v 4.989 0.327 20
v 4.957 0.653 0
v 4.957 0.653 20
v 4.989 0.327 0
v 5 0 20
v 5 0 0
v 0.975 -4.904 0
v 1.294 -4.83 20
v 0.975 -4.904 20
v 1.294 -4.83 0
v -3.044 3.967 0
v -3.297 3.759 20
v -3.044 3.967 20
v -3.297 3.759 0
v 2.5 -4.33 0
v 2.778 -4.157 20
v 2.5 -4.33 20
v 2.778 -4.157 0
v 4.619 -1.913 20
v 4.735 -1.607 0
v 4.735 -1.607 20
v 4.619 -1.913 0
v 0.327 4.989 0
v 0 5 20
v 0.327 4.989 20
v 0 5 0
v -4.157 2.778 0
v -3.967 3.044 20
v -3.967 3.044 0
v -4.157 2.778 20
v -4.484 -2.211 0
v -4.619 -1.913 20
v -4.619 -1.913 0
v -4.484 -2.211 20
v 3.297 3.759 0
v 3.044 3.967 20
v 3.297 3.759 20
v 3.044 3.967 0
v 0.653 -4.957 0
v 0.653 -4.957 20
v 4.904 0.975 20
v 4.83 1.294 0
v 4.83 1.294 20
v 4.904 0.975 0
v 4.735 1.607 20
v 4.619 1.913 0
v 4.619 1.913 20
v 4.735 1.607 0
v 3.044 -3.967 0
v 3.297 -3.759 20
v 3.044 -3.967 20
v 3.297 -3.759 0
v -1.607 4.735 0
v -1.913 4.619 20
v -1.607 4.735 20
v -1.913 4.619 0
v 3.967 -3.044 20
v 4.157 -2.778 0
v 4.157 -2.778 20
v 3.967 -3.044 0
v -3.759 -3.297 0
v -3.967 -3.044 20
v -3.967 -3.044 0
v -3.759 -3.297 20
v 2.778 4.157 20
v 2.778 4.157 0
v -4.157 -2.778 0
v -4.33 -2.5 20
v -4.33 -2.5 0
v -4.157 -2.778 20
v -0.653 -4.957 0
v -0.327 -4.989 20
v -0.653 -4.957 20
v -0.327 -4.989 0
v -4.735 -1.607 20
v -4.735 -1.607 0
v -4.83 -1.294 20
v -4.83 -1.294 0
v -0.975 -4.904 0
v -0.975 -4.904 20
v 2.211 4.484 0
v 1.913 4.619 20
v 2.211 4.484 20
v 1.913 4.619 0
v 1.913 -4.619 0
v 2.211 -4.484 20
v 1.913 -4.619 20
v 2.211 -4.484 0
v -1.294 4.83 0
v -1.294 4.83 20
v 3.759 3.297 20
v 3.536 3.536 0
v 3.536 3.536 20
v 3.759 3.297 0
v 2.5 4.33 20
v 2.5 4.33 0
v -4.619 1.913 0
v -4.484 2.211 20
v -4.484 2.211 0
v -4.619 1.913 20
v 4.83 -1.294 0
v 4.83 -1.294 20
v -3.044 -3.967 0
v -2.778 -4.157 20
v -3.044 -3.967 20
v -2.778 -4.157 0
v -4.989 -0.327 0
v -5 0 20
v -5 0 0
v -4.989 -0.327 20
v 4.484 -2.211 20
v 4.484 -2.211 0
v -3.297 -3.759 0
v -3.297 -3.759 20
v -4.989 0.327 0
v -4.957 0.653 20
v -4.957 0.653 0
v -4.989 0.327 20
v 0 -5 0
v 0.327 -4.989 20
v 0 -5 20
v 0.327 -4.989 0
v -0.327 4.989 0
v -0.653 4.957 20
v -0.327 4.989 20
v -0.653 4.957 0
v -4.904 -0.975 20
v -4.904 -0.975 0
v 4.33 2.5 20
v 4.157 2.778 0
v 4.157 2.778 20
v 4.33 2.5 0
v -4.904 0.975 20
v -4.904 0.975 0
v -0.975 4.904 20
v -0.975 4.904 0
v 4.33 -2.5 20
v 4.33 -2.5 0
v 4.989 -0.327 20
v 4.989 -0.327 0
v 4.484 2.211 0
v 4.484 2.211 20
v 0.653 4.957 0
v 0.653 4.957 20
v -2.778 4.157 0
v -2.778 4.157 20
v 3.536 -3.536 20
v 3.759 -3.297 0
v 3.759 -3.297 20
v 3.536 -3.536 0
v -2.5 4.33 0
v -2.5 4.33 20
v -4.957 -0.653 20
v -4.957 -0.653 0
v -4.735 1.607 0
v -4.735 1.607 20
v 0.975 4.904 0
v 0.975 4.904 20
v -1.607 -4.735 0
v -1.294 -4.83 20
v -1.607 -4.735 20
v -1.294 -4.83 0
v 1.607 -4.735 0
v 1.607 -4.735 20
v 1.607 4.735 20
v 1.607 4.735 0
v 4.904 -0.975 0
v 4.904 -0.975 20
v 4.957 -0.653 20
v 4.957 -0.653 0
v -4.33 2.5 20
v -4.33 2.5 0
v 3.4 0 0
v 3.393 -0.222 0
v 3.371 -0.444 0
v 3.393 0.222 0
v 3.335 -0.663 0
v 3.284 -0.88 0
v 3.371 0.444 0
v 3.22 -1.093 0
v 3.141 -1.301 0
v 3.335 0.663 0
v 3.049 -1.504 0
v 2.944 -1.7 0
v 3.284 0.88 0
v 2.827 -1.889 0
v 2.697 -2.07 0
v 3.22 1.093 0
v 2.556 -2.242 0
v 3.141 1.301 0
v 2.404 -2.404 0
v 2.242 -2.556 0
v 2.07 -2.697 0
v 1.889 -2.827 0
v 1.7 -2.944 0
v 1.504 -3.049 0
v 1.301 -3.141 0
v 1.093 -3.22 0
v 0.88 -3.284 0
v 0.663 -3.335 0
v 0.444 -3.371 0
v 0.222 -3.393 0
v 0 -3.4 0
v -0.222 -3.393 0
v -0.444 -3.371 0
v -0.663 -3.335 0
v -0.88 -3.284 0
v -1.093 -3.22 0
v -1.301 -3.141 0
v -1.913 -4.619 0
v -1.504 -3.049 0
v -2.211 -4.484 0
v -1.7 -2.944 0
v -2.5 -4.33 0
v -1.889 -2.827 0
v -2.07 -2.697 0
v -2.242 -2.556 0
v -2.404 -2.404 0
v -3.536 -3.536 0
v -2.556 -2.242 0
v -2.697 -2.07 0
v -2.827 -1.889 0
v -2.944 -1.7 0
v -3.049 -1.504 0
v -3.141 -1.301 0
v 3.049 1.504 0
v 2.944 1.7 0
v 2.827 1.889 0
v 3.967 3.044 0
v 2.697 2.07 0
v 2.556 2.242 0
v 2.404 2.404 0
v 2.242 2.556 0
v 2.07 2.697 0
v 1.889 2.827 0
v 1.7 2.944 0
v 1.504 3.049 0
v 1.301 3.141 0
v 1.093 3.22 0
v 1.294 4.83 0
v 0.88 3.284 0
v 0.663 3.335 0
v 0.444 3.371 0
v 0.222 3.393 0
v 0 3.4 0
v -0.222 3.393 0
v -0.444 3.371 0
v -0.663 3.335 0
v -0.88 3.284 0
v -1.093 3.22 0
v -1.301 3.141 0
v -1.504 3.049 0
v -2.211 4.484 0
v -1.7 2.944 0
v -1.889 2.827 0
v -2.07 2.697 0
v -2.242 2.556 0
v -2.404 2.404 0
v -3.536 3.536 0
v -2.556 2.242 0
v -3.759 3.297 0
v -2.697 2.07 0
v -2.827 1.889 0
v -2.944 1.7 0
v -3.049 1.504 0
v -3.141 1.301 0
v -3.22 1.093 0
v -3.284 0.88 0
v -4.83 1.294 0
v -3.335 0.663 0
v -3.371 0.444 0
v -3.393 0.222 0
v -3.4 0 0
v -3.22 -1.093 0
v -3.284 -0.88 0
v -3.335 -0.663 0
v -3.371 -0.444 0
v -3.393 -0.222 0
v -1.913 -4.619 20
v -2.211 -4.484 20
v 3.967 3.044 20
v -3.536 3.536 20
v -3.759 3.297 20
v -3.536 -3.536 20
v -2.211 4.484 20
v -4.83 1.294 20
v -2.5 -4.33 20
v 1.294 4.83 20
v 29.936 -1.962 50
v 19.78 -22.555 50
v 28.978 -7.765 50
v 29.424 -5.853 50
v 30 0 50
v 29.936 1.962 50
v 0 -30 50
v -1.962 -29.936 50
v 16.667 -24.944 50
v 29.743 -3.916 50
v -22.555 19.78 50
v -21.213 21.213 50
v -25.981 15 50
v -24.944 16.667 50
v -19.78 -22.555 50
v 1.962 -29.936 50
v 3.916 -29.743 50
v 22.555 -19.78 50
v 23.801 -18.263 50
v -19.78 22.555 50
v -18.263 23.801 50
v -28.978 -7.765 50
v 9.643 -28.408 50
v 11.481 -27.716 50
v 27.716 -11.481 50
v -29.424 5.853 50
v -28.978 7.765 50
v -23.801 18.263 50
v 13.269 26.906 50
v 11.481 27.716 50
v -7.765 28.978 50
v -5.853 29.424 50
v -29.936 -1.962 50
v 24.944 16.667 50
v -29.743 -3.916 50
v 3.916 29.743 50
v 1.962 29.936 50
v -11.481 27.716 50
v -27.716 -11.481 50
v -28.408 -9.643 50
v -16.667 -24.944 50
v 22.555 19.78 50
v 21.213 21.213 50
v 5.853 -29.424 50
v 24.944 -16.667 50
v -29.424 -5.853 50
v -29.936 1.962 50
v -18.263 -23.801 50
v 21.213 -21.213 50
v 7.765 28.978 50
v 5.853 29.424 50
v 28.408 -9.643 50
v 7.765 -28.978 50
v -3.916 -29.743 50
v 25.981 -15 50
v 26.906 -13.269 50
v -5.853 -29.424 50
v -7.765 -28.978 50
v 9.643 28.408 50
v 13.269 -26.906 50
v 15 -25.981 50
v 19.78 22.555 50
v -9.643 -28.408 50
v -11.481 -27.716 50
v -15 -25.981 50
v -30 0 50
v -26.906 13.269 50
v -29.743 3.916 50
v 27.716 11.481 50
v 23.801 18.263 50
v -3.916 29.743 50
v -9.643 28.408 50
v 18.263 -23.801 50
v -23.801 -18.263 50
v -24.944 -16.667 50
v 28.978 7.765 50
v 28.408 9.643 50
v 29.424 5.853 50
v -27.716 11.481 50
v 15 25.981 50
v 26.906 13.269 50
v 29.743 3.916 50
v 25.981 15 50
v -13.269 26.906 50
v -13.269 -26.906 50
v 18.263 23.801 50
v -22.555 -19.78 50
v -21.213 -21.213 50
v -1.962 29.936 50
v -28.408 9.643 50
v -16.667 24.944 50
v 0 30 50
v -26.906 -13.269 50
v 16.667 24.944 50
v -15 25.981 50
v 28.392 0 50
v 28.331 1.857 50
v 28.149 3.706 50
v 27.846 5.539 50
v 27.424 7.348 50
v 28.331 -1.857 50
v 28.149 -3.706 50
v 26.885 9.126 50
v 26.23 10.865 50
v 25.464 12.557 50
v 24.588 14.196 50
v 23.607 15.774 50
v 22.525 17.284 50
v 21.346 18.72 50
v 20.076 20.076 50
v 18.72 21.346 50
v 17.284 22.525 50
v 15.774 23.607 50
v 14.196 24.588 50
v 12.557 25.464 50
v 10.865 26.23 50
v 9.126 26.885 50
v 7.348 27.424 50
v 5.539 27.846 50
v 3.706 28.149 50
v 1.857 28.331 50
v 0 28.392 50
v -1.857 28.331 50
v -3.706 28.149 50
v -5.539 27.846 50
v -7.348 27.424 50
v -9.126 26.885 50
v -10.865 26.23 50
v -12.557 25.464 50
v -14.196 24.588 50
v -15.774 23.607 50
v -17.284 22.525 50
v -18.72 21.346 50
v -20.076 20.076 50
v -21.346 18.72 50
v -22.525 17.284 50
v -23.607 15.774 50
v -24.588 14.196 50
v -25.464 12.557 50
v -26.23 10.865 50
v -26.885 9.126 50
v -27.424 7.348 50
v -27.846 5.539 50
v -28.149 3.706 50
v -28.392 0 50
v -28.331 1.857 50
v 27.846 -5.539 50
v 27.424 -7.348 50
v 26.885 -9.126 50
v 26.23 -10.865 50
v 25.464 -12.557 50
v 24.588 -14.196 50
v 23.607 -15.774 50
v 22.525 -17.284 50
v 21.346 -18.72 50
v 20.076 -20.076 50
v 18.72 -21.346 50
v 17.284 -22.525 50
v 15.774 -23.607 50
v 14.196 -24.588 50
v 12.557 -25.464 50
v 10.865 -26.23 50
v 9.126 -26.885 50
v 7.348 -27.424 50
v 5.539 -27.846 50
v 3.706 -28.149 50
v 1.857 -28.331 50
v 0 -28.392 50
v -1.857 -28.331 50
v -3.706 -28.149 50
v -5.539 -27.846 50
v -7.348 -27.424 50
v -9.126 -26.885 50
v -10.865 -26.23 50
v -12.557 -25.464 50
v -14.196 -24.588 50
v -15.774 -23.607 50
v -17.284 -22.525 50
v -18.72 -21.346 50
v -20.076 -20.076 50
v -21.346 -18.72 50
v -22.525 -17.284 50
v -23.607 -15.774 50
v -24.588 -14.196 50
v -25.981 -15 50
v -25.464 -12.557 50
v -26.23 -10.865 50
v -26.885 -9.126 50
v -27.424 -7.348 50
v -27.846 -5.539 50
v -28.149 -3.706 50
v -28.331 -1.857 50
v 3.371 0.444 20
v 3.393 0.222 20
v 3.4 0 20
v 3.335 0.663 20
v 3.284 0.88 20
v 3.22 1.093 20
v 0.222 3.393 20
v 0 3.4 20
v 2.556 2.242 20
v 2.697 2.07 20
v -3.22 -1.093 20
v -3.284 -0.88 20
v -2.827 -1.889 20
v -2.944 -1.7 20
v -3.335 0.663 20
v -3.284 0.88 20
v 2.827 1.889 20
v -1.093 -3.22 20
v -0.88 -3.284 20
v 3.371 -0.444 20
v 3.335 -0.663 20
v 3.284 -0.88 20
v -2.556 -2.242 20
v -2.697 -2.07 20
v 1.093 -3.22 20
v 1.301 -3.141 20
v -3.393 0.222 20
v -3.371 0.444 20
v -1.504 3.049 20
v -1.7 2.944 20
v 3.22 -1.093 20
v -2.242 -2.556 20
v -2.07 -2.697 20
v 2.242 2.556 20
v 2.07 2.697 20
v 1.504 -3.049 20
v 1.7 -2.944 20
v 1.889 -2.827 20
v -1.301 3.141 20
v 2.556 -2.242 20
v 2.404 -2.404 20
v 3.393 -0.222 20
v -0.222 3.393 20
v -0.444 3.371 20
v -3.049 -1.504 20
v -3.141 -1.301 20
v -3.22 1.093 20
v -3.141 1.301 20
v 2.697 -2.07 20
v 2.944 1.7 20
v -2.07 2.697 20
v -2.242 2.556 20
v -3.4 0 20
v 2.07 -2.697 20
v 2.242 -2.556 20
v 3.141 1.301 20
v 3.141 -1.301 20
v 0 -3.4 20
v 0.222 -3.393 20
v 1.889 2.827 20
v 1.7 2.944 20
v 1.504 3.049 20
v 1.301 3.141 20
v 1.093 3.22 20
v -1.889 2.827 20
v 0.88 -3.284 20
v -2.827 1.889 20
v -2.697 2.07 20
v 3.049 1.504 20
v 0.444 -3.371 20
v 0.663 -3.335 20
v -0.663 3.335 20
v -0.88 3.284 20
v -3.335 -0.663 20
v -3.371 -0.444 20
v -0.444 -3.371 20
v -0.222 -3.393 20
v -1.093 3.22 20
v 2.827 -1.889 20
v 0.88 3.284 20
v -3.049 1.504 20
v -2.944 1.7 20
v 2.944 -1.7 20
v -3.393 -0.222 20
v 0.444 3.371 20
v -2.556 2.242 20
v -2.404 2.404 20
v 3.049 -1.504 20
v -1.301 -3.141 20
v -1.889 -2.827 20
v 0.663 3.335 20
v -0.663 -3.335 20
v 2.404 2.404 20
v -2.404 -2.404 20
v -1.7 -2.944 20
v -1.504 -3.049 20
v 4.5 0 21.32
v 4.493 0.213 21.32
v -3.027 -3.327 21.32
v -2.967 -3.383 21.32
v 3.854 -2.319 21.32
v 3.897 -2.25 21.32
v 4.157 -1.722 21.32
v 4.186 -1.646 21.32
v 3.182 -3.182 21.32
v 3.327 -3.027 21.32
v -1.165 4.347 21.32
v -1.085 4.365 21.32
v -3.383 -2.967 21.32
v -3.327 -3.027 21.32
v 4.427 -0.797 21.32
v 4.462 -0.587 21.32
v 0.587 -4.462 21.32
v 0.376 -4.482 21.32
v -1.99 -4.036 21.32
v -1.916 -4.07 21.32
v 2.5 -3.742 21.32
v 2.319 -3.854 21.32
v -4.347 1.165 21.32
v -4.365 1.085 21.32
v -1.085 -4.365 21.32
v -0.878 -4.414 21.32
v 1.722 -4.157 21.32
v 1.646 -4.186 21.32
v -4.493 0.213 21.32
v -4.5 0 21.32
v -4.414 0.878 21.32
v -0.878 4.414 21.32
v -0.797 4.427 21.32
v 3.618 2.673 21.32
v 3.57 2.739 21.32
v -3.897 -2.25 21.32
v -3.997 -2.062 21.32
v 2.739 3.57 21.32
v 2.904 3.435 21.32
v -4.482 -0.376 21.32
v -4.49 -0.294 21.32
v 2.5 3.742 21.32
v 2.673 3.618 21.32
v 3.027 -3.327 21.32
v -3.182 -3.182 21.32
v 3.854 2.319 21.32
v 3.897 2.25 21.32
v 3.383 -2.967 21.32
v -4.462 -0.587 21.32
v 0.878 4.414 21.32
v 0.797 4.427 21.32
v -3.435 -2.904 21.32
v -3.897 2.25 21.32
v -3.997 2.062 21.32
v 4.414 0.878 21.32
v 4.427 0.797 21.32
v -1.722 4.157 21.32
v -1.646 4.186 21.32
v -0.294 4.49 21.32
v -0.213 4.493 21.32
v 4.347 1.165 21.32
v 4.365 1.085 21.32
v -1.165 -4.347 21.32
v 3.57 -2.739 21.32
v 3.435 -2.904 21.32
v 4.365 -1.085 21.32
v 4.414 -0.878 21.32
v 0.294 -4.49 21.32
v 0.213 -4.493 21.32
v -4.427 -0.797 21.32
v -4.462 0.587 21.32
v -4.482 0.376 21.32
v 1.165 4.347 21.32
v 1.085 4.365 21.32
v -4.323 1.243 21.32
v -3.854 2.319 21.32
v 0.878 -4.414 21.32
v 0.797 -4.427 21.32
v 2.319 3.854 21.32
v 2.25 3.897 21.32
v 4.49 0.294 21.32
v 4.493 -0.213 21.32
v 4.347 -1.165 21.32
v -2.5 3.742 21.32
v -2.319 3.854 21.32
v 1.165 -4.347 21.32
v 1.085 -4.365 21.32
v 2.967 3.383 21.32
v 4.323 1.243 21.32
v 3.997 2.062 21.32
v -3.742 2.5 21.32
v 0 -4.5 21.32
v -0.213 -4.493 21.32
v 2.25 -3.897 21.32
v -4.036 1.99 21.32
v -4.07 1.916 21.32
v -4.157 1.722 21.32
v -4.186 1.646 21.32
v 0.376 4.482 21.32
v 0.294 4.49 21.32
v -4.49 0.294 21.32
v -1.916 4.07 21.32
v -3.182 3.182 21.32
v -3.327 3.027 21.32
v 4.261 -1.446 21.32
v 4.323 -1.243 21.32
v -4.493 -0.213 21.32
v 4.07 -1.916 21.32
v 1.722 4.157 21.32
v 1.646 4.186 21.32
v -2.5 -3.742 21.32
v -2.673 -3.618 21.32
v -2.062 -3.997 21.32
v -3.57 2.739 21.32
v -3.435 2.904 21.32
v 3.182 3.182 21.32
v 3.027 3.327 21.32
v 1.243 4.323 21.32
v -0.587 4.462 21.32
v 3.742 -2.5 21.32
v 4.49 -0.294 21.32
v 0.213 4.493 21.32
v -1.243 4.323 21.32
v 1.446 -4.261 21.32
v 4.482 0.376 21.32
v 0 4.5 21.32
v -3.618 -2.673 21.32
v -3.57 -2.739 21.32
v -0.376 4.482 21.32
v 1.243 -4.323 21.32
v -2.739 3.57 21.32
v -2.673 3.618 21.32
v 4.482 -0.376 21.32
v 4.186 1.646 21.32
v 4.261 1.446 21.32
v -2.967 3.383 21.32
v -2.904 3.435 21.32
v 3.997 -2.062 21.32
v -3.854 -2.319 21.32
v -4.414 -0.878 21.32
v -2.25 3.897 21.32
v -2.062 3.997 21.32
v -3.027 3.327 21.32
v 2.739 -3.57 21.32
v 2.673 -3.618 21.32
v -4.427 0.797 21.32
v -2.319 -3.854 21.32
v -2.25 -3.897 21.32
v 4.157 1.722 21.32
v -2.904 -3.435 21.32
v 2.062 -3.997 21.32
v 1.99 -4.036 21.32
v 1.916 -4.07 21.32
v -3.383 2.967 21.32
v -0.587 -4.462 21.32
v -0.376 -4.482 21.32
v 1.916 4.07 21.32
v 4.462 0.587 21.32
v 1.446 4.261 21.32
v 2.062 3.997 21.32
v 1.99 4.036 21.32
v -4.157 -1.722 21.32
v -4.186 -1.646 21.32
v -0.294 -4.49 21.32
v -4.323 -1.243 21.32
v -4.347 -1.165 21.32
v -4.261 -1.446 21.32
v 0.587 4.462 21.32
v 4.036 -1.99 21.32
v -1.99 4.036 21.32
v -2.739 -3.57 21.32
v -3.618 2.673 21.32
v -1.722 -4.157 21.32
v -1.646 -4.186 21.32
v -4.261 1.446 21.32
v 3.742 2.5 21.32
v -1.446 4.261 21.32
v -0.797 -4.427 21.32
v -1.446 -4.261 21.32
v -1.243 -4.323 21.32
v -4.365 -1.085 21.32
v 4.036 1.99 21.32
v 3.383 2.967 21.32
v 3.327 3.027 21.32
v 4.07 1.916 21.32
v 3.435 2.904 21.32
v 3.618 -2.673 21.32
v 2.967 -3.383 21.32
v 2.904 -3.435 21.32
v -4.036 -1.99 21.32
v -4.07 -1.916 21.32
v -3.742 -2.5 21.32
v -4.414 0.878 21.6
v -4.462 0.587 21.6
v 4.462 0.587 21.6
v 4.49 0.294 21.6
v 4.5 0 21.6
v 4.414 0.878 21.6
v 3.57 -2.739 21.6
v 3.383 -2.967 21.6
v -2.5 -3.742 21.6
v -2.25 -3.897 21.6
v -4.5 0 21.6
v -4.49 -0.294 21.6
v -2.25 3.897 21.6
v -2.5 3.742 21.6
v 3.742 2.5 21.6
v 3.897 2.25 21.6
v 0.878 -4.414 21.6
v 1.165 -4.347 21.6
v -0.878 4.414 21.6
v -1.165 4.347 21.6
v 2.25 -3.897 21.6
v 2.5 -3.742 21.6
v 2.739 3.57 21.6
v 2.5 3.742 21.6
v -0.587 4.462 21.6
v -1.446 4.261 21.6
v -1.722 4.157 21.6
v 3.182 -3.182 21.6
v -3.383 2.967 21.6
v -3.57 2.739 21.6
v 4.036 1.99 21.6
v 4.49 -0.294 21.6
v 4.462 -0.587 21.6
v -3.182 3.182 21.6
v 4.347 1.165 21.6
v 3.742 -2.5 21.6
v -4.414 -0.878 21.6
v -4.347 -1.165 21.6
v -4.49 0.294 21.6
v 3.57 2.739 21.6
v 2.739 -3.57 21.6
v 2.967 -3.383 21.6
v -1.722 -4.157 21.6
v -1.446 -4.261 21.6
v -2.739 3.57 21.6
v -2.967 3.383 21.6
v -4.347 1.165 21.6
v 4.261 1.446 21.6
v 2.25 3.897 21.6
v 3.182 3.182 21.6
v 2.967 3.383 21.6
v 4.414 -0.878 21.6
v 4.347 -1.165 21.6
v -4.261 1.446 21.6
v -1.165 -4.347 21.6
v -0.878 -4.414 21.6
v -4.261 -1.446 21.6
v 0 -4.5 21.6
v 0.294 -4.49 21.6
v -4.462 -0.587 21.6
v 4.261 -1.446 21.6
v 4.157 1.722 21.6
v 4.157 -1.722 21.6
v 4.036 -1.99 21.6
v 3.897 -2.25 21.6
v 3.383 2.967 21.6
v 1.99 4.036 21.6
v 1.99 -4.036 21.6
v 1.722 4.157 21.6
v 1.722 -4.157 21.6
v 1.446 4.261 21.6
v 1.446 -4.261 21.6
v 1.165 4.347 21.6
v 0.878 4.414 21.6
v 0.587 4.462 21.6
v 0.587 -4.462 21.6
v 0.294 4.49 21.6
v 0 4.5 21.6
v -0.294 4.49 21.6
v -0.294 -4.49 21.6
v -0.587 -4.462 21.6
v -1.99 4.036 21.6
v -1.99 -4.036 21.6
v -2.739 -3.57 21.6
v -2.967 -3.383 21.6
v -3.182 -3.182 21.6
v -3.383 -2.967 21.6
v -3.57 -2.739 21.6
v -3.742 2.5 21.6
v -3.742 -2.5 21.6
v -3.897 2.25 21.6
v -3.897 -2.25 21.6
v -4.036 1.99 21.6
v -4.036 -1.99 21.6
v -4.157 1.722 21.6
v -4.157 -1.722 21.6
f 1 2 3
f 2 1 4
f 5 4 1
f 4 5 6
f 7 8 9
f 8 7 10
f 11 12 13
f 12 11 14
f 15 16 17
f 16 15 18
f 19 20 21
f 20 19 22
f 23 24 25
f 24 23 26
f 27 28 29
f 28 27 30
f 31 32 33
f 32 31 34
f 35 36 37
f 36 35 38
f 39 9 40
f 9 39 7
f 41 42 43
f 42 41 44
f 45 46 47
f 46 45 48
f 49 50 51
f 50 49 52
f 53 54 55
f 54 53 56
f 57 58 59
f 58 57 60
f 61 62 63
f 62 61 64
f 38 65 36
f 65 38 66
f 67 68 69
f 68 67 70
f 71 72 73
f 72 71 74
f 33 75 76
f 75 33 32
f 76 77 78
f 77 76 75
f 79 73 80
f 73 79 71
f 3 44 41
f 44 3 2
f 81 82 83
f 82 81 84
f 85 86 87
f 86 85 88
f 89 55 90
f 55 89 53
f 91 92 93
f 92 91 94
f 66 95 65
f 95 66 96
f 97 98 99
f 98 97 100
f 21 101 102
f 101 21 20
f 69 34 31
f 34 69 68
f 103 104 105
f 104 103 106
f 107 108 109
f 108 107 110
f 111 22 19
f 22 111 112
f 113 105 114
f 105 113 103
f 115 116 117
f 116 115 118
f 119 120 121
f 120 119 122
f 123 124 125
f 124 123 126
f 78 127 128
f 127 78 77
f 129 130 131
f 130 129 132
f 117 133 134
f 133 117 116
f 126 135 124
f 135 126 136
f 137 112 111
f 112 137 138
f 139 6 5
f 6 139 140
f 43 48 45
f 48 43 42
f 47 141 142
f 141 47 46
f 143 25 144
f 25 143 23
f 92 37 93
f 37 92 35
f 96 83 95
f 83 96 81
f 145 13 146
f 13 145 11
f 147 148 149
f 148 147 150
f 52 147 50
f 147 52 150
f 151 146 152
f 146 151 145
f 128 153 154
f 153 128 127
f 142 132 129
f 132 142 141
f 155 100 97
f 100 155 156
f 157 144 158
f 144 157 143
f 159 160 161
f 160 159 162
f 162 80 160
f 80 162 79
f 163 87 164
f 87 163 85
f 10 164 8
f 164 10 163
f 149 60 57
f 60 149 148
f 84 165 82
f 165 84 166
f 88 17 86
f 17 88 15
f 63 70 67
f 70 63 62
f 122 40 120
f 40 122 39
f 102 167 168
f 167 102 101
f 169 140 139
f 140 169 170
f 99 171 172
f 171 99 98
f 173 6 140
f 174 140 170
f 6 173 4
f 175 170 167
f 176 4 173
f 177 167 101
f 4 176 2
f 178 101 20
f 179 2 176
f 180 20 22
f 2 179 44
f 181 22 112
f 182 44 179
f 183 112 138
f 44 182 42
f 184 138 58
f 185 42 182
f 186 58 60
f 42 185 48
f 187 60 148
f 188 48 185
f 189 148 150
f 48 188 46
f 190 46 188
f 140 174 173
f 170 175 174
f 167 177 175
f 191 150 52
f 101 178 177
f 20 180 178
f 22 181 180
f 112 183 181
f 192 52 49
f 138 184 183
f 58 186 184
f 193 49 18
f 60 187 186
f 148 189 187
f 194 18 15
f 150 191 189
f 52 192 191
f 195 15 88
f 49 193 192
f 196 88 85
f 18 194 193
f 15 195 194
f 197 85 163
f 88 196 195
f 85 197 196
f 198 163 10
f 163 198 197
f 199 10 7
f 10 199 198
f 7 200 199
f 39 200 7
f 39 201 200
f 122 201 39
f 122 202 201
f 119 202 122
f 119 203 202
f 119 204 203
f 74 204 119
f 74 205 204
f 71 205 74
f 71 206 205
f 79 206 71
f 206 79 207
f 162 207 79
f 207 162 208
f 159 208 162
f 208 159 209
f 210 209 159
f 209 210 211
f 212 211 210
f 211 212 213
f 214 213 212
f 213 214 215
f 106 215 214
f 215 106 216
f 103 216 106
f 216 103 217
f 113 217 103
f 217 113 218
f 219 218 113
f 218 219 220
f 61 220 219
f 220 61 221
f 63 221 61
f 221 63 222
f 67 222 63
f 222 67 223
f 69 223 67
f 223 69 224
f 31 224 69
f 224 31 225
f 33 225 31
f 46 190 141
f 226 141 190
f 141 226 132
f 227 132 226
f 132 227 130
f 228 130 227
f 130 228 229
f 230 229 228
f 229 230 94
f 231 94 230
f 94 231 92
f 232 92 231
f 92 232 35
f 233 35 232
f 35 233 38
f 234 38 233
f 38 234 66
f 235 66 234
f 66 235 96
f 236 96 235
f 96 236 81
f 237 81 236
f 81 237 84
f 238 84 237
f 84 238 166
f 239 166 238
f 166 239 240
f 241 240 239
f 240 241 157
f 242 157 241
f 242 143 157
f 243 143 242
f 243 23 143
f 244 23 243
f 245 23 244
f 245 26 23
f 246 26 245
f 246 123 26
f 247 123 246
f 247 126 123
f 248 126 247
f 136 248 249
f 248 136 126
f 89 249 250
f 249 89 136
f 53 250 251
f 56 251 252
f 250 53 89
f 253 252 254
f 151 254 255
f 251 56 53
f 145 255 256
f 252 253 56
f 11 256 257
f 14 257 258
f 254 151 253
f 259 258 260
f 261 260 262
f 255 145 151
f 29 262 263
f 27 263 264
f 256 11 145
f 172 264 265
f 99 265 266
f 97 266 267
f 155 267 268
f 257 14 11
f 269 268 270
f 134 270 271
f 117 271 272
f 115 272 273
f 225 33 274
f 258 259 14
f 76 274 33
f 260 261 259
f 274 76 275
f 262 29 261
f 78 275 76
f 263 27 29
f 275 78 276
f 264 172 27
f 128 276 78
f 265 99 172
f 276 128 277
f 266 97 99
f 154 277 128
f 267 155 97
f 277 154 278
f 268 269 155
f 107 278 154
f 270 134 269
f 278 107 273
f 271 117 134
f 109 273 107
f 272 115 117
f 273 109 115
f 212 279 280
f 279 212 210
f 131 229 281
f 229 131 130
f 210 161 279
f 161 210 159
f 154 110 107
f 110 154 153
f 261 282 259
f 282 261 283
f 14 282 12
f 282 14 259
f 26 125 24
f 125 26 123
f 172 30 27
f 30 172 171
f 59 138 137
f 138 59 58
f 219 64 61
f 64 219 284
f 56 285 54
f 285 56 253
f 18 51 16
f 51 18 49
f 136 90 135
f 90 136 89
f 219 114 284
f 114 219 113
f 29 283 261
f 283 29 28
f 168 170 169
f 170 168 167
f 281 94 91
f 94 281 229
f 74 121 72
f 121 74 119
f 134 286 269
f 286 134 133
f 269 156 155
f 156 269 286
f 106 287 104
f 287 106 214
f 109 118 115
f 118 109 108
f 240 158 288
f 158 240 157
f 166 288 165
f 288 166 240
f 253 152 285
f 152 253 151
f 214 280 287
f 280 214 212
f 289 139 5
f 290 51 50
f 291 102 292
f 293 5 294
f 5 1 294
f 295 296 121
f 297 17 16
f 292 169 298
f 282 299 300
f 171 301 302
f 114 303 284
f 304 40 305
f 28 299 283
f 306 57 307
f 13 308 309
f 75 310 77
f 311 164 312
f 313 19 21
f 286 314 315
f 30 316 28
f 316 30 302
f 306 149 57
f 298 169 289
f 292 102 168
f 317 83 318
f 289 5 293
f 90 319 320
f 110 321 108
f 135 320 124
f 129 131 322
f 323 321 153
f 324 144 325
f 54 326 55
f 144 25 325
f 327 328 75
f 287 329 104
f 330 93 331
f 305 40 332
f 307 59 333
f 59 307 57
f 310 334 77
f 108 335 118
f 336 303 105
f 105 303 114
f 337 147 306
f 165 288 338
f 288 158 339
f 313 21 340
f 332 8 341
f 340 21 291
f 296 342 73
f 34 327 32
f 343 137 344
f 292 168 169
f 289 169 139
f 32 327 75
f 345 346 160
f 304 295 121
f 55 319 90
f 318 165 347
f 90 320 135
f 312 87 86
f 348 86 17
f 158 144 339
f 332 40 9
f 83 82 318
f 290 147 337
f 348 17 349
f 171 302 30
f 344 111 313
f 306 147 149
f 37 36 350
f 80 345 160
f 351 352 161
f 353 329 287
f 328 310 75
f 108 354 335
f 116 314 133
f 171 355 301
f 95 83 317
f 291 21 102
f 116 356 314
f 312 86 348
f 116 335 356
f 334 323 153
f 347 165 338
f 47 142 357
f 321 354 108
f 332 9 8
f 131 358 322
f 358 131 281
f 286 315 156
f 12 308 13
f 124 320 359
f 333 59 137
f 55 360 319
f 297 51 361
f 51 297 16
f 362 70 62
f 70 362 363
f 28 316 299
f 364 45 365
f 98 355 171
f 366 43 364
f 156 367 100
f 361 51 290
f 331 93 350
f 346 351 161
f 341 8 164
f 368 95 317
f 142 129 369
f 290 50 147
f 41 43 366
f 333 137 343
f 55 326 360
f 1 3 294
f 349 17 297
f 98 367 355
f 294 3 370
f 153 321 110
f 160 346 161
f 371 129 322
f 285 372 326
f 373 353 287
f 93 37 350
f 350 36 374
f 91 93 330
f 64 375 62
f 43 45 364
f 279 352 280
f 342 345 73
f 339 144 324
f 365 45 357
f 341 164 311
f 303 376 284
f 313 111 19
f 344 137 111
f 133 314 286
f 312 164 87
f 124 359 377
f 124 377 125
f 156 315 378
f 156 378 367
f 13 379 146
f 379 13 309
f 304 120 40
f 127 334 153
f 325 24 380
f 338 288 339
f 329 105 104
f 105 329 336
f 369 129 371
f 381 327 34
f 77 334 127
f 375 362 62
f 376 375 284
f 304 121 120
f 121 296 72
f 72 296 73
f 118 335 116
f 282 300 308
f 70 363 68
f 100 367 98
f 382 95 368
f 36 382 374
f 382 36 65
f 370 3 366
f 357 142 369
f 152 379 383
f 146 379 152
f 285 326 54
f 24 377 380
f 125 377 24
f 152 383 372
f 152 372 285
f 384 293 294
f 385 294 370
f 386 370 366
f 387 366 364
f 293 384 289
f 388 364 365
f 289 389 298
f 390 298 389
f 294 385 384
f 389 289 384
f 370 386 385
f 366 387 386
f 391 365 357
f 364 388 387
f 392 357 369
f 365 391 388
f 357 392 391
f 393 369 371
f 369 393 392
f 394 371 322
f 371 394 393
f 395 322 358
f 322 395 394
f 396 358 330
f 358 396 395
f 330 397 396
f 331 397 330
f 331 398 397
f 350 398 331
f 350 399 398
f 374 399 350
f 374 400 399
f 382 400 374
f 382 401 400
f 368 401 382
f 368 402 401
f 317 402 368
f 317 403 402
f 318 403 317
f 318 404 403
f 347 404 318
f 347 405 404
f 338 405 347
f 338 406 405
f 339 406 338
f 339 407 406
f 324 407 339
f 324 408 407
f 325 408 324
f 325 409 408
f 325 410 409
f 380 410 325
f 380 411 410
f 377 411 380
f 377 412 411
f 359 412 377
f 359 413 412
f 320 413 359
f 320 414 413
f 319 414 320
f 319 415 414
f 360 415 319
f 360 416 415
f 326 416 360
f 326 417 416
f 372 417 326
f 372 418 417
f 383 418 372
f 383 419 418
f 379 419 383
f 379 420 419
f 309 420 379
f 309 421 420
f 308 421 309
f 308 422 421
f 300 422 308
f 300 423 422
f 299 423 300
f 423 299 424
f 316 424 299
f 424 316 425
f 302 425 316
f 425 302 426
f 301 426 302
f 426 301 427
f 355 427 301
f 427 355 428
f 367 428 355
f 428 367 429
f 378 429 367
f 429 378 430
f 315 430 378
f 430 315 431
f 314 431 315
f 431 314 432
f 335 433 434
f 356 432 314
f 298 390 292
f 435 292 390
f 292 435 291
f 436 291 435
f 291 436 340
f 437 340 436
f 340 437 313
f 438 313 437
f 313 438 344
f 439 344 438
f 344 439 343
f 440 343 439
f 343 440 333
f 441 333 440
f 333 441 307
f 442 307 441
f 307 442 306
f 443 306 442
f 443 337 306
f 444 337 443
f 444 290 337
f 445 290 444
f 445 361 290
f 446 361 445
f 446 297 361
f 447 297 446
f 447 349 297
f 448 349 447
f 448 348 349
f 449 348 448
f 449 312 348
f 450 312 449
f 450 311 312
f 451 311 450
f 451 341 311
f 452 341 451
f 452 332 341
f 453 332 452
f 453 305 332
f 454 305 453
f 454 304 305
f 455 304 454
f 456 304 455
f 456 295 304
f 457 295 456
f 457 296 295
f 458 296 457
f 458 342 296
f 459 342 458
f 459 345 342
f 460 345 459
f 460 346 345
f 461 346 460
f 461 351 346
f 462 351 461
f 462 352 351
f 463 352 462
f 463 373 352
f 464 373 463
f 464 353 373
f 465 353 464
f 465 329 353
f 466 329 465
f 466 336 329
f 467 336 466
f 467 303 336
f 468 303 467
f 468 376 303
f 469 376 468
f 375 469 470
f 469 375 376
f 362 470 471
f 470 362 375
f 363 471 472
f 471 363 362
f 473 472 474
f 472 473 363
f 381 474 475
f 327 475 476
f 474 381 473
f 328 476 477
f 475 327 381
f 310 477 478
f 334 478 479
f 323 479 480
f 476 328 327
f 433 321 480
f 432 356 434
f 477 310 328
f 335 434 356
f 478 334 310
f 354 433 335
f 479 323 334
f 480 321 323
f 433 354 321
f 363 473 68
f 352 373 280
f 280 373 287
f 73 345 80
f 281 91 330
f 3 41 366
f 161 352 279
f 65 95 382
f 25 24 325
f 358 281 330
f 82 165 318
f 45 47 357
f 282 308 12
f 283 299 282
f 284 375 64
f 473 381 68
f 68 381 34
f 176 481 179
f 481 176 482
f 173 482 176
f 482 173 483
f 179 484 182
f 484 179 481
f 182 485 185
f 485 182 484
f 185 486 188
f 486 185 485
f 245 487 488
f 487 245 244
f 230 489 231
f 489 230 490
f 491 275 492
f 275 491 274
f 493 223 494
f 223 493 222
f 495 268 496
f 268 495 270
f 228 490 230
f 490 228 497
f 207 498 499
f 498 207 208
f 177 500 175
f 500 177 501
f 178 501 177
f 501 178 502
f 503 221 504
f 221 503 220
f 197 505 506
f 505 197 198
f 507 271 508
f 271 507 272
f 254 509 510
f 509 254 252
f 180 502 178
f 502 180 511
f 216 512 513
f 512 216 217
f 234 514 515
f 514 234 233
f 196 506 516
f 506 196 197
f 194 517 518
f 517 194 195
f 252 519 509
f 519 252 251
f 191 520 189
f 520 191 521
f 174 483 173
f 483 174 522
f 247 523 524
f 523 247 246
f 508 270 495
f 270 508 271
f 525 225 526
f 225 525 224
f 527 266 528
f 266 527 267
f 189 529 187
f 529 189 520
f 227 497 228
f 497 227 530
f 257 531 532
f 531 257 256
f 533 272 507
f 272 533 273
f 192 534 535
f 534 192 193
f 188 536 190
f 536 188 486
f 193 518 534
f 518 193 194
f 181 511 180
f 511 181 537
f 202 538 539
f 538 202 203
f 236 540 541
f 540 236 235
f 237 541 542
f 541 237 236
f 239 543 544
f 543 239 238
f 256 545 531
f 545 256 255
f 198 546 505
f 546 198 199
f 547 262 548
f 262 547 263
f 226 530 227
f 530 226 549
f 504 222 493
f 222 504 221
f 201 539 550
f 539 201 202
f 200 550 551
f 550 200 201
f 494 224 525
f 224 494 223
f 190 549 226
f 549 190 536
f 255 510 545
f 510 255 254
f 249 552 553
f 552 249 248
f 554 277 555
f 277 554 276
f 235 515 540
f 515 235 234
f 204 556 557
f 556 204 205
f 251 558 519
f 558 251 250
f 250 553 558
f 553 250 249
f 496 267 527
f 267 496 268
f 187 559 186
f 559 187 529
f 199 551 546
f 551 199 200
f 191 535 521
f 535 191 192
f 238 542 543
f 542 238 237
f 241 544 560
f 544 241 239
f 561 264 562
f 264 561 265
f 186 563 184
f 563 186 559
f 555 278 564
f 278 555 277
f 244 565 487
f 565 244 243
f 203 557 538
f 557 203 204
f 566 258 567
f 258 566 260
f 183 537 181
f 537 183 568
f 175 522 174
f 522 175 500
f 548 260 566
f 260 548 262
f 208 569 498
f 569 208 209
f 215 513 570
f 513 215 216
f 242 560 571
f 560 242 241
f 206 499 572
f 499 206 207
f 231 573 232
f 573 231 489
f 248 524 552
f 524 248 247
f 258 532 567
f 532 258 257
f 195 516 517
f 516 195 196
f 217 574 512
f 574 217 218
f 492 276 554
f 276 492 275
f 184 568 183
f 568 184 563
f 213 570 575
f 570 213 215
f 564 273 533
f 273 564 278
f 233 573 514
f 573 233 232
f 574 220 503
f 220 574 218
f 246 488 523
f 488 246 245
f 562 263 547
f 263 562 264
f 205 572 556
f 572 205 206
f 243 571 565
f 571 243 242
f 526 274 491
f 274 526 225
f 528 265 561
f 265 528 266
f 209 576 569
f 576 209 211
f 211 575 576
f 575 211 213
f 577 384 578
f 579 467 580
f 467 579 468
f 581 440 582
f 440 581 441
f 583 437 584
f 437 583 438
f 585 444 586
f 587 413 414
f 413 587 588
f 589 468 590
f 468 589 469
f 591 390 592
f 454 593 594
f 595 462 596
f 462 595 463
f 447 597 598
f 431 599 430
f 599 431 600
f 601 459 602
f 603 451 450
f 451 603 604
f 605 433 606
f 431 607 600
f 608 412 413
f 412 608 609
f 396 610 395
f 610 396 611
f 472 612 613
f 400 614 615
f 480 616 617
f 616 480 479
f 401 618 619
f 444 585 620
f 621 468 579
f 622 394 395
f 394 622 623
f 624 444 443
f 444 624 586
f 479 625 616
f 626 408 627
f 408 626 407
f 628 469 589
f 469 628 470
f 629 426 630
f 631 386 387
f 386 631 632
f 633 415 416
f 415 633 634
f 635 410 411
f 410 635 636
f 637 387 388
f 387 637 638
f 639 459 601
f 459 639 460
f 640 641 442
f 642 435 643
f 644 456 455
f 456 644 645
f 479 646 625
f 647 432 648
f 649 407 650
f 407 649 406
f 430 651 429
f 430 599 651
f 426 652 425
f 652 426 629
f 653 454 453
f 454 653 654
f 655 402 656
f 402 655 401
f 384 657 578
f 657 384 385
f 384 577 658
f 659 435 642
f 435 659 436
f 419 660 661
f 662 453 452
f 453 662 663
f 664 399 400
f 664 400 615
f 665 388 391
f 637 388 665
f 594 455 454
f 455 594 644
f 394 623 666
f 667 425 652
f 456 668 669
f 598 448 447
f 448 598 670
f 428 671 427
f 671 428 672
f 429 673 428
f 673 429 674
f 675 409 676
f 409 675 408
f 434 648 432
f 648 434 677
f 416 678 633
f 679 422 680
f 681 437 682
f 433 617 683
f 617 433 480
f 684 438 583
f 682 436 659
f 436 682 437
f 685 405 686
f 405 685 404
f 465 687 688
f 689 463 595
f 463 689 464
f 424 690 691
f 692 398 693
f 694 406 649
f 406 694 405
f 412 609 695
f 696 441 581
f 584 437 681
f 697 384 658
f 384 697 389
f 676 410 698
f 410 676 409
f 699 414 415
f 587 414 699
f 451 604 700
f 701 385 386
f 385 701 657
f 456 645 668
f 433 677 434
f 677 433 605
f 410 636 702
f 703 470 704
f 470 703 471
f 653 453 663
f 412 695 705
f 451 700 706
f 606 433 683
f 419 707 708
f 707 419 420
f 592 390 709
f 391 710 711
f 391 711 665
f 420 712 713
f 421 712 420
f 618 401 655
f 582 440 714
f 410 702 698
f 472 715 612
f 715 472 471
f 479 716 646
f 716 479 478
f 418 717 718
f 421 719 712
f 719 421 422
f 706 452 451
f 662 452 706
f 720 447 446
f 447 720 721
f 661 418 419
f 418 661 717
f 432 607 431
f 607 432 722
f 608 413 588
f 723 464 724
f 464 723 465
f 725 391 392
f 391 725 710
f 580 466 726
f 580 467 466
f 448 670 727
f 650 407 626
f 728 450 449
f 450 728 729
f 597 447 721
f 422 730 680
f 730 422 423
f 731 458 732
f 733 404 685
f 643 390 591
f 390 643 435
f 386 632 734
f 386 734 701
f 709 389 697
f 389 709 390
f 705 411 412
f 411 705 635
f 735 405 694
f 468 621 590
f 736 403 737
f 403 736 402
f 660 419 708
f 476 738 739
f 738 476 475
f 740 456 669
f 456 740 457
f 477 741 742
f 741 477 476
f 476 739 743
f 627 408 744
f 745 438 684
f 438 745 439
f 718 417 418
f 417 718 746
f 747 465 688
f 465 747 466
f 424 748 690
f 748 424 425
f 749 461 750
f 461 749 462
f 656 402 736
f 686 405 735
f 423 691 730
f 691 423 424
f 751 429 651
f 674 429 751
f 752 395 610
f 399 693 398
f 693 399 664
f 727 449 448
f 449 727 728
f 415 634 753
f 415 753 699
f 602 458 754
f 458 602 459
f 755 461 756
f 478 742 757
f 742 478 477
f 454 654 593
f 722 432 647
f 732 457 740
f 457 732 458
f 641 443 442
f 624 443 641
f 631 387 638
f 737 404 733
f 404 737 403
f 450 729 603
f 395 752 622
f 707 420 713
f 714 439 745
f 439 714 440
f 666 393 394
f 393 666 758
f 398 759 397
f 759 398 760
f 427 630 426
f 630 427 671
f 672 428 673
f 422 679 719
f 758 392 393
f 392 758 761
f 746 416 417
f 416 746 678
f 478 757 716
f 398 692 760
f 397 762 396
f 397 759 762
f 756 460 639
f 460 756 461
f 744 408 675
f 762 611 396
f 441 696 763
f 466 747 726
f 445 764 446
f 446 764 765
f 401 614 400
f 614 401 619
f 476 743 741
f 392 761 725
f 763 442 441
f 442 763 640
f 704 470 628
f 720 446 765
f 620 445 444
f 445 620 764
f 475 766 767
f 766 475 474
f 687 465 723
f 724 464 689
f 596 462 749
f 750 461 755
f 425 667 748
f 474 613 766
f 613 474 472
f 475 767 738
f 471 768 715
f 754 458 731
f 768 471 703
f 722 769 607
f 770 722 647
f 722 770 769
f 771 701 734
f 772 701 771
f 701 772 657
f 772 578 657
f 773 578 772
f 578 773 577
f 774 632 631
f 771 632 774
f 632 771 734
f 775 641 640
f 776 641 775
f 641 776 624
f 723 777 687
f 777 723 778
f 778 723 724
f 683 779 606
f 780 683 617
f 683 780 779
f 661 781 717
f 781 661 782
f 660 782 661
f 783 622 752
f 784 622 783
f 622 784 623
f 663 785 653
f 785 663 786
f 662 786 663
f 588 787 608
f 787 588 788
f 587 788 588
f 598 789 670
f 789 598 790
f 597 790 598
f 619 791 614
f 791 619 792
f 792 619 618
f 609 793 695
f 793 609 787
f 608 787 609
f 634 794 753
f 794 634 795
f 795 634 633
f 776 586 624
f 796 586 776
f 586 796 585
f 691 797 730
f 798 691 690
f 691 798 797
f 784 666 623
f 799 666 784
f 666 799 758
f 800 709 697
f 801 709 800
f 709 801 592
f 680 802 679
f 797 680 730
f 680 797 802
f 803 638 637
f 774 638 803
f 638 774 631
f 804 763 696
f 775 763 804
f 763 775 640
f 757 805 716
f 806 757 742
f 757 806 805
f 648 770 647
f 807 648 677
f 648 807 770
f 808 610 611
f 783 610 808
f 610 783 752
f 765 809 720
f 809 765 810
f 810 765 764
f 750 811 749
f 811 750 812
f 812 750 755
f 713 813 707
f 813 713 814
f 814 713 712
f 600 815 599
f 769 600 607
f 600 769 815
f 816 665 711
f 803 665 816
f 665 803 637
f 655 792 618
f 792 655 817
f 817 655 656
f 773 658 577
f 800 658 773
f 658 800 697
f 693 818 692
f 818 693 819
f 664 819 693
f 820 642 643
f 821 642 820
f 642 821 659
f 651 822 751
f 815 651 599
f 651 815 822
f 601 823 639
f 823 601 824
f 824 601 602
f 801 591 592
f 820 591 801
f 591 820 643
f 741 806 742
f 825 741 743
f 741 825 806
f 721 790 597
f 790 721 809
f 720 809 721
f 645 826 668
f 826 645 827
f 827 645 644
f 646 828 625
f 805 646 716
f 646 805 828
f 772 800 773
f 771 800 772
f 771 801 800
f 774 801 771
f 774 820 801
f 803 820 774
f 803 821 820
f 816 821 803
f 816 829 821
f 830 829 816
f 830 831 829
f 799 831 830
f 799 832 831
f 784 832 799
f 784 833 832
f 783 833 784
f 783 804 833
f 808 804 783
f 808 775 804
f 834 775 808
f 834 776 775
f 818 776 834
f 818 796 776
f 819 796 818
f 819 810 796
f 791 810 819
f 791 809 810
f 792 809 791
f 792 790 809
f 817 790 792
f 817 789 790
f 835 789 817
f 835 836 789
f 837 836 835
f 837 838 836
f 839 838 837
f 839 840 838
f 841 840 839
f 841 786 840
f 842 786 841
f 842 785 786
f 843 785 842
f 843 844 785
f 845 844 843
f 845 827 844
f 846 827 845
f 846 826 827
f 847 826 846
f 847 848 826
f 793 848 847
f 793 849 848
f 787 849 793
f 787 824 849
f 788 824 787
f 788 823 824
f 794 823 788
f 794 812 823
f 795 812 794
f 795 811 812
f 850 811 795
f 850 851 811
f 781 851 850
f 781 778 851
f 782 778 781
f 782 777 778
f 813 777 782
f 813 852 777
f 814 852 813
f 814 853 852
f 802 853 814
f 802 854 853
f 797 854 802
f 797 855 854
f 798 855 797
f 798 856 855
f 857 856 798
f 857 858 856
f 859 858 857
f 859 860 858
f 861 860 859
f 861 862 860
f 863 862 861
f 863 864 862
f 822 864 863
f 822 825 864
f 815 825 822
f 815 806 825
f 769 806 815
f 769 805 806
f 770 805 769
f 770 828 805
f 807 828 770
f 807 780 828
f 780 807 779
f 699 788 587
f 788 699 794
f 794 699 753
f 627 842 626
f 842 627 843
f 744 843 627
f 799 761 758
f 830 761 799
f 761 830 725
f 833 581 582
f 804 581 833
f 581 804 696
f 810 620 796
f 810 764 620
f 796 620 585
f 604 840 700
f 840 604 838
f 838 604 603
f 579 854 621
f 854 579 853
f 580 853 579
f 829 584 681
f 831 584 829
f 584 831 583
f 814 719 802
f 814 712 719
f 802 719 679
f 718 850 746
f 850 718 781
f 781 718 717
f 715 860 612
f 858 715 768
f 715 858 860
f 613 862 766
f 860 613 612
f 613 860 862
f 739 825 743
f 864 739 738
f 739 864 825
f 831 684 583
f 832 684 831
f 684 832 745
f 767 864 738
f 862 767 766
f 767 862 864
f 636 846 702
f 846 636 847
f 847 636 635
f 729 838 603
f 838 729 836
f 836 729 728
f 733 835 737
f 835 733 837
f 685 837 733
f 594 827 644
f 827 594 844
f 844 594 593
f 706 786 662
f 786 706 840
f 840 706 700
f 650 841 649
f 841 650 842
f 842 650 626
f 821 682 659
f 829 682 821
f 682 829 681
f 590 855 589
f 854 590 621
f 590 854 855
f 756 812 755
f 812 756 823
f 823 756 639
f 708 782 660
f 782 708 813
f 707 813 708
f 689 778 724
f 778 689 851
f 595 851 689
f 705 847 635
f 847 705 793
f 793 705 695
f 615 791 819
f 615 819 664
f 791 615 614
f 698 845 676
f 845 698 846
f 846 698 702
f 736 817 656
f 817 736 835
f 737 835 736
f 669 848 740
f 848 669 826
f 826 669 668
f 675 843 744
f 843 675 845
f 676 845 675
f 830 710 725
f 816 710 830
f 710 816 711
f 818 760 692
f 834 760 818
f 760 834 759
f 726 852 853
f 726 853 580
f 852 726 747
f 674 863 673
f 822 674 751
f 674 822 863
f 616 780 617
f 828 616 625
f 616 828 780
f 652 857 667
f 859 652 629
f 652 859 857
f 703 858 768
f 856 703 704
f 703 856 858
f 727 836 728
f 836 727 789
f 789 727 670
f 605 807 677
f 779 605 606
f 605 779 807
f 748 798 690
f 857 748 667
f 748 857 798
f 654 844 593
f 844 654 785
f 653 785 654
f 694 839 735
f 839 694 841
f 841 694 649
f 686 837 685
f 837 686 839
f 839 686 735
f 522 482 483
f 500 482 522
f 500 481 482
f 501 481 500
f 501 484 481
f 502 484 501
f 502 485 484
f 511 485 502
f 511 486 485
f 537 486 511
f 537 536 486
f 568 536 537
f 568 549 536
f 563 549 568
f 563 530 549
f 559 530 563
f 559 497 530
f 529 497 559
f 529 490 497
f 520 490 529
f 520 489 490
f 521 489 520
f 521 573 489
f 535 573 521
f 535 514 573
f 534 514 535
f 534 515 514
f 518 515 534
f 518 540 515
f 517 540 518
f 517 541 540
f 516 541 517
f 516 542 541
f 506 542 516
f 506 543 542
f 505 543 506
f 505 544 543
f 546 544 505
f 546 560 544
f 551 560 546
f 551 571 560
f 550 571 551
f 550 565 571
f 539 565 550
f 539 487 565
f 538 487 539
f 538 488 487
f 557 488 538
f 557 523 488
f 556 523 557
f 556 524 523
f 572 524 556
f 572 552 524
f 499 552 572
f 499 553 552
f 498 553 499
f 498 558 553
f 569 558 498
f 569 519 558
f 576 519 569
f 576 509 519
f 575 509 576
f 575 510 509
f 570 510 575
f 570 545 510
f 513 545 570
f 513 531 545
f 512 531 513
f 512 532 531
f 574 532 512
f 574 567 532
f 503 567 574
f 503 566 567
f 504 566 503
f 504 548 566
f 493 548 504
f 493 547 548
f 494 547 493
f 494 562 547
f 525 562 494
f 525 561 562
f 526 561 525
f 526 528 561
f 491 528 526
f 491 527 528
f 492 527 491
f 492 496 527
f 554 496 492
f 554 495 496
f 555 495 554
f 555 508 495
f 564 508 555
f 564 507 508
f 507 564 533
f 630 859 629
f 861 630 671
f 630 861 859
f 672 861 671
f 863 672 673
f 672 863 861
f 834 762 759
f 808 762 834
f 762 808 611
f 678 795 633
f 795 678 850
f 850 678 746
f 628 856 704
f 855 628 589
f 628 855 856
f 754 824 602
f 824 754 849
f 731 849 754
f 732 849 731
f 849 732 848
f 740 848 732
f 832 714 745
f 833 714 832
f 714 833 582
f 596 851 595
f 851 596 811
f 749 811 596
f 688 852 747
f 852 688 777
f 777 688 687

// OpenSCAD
union(){
// Small lab funnel, 60 mm, with straight spout
// Category: tools. Cone walls stay below 45 deg from vertical, so it prints upright
// without supports.
// Print: PETG or PP for chemical resistance, 0.2 mm layers, 3+ perimeters.
// SPDX-License-Identifier: CERN-OHL-P-2.0

/* [Funnel] */
top_od = 60;           // outer diameter at the rim
spout_od = 10;         // outer diameter of the spout
wall = 1.6;
spout_h = 20;          // spout from z = 0 to z = spout_h
cone_h = 30;           // cone from z = spout_h to the rim

/* [Hidden] */
$fn = 96;
eps = 0.01;

difference() {
    union() {
        cylinder(d = spout_od, h = spout_h + eps);
        translate([0, 0, spout_h]) cylinder(d1 = spout_od, d2 = top_od, h = cone_h);
    }
    translate([0, 0, -eps]) cylinder(d = spout_od - 2 * wall, h = spout_h + 2 * eps);
    translate([0, 0, spout_h]) cylinder(d1 = spout_od - 2 * wall, d2 = top_od - 2 * wall, h = cone_h + eps);
}

translate([0,0,20]) cylinder(d=9,h=1.6);}
